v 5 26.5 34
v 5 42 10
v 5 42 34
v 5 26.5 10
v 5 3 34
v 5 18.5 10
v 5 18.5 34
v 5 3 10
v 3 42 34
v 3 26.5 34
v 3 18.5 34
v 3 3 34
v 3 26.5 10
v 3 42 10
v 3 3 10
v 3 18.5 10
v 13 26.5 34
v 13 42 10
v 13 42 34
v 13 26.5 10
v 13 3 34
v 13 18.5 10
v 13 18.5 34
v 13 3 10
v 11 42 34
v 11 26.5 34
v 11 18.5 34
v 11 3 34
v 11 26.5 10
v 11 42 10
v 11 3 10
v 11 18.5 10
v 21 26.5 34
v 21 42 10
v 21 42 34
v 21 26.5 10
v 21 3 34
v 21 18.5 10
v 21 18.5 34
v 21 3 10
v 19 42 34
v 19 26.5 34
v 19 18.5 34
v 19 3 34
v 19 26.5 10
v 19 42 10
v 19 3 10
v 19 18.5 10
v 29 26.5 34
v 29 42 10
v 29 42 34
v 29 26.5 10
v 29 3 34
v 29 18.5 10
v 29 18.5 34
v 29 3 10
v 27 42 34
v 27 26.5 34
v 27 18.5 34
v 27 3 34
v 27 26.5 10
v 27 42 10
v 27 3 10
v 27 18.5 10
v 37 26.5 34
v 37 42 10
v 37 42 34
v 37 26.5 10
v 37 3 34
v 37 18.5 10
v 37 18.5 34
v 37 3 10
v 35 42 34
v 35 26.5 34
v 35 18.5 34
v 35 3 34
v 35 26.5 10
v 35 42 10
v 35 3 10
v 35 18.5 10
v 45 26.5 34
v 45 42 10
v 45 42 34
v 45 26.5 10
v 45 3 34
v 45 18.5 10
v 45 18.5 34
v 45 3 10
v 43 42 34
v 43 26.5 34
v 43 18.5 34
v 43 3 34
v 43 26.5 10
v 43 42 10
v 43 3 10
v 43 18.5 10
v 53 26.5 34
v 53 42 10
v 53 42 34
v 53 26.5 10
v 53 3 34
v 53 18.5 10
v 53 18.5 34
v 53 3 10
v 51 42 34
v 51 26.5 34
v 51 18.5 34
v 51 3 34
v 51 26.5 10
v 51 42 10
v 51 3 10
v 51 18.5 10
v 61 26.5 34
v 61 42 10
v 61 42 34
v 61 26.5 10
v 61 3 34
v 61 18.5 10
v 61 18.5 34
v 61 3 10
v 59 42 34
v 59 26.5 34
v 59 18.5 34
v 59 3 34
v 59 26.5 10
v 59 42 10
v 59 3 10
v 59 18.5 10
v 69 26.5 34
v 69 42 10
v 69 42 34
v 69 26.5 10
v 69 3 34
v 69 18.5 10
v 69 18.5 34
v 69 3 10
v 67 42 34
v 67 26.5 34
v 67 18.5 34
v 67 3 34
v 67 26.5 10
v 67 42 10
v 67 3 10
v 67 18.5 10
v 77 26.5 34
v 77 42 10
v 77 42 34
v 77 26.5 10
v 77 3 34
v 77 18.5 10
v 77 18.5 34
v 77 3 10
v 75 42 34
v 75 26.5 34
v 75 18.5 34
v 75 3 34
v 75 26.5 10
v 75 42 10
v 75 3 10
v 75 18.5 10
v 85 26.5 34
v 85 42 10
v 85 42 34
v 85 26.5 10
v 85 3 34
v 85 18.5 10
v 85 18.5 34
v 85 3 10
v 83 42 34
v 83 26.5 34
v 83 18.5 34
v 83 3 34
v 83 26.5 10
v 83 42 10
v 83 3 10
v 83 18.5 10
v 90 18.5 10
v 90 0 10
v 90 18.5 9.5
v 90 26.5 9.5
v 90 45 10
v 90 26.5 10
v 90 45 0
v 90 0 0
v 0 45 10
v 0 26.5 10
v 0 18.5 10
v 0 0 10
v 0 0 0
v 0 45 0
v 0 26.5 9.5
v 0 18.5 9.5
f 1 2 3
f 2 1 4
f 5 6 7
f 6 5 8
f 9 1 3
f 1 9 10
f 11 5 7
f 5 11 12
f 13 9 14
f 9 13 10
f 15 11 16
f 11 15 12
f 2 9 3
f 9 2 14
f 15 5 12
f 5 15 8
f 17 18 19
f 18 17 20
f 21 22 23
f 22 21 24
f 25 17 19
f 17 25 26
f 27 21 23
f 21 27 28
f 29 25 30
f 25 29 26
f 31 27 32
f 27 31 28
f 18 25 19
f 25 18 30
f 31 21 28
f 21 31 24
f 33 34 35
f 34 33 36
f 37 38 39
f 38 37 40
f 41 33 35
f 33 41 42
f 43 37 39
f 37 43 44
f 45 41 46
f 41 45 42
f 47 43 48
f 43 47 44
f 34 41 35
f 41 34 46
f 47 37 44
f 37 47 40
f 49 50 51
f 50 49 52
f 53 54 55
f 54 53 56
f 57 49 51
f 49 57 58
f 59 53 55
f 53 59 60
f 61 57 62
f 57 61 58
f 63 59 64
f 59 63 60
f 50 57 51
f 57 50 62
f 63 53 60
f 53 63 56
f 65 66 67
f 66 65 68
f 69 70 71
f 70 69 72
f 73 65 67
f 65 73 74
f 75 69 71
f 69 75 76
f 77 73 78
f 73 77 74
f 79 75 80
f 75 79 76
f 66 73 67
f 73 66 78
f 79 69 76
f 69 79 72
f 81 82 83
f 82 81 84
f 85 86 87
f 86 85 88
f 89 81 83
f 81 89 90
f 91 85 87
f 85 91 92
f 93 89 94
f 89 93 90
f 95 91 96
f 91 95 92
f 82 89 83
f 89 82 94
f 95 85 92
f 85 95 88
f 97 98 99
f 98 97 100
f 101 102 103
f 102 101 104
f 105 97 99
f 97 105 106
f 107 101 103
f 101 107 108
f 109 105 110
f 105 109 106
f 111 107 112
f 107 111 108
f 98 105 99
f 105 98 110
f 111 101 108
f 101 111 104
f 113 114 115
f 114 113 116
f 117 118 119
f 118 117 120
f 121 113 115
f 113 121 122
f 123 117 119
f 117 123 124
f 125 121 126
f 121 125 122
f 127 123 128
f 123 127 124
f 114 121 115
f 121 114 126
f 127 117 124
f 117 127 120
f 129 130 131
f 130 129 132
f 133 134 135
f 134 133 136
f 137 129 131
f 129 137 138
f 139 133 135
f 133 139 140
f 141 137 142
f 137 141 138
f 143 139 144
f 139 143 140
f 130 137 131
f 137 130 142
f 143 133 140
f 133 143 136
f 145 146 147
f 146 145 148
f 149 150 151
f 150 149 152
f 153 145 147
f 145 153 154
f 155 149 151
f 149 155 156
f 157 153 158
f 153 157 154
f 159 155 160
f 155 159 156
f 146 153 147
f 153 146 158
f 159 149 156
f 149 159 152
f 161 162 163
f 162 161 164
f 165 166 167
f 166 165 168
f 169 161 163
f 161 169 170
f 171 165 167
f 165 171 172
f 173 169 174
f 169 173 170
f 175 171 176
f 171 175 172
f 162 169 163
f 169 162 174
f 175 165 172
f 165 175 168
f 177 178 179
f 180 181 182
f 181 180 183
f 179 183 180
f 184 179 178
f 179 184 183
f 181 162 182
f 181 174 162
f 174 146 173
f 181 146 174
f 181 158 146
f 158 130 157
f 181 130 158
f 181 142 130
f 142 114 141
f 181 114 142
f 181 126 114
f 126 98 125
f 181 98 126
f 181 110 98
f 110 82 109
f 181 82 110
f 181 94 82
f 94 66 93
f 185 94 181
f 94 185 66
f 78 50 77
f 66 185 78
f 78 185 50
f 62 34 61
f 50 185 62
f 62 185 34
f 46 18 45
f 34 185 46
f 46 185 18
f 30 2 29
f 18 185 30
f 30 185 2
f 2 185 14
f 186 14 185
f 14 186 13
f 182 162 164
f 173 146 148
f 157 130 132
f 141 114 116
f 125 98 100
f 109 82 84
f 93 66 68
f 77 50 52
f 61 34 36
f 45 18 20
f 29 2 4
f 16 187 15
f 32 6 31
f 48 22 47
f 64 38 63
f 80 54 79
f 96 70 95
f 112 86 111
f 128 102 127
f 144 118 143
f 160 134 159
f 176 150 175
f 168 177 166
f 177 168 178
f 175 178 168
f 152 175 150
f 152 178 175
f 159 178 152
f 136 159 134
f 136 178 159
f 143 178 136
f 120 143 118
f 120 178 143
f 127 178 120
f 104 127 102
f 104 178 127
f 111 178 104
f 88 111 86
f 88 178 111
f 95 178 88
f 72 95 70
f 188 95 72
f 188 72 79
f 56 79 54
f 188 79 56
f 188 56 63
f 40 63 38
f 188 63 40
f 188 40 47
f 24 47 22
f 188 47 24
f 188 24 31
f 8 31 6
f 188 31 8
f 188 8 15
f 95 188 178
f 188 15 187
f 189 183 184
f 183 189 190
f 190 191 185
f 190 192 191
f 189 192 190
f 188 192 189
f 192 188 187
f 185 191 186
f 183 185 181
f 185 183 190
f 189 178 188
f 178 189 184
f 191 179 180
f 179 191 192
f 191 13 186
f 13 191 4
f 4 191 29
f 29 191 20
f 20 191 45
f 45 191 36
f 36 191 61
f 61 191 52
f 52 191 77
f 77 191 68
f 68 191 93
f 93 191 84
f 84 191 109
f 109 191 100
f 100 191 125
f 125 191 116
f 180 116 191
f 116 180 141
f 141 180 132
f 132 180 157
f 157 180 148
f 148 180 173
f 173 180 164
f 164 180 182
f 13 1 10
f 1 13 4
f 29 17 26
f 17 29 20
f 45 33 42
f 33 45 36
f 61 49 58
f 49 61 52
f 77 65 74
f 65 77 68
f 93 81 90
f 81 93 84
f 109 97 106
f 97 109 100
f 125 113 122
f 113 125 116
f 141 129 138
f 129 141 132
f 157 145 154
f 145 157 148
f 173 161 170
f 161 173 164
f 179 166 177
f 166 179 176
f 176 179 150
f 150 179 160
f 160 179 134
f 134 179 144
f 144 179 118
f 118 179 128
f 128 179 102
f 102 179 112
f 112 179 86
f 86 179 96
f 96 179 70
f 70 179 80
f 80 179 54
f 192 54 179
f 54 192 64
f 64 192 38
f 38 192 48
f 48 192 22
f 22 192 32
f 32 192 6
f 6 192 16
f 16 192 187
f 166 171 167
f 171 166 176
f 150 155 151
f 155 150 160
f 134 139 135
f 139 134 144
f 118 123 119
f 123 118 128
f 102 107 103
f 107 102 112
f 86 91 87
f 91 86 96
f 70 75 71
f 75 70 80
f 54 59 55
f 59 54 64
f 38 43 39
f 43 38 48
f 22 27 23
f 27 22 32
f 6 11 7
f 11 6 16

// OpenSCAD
$fn = 32;

// ----------------------------------------------------------------------
// Heatsink: slotted fin block
// ----------------------------------------------------------------------

// --- parameters (mm) ---
base_l = 90;              // base length, X
base_w = 45;              // base width, Y
base_t = 10;              // base plate thickness
fin_h = 25;               // fin height above the base
fin_t = 2;                // fin thickness
edge = 3;                 // margin from the base ends
pitch = 8;                // fin pitch
slot_w = 8;               // central slot width, Y

n_fins = floor((base_l - 2 * edge - fin_t) / pitch) + 1;  // fin count
total_h = base_t + fin_h - 1;  // overall height

difference() {
union() {
  cube([base_l, base_w, base_t]);
  for (i = [0 : n_fins - 1])
    translate([edge + i * pitch, edge, base_t - 1])
      cube([fin_t, base_w - 2 * edge, fin_h]);
}
  translate([-1, base_w / 2 - slot_w / 2, base_t - 0.5])
    cube([base_l + 2, slot_w, fin_h + 2]);
}
